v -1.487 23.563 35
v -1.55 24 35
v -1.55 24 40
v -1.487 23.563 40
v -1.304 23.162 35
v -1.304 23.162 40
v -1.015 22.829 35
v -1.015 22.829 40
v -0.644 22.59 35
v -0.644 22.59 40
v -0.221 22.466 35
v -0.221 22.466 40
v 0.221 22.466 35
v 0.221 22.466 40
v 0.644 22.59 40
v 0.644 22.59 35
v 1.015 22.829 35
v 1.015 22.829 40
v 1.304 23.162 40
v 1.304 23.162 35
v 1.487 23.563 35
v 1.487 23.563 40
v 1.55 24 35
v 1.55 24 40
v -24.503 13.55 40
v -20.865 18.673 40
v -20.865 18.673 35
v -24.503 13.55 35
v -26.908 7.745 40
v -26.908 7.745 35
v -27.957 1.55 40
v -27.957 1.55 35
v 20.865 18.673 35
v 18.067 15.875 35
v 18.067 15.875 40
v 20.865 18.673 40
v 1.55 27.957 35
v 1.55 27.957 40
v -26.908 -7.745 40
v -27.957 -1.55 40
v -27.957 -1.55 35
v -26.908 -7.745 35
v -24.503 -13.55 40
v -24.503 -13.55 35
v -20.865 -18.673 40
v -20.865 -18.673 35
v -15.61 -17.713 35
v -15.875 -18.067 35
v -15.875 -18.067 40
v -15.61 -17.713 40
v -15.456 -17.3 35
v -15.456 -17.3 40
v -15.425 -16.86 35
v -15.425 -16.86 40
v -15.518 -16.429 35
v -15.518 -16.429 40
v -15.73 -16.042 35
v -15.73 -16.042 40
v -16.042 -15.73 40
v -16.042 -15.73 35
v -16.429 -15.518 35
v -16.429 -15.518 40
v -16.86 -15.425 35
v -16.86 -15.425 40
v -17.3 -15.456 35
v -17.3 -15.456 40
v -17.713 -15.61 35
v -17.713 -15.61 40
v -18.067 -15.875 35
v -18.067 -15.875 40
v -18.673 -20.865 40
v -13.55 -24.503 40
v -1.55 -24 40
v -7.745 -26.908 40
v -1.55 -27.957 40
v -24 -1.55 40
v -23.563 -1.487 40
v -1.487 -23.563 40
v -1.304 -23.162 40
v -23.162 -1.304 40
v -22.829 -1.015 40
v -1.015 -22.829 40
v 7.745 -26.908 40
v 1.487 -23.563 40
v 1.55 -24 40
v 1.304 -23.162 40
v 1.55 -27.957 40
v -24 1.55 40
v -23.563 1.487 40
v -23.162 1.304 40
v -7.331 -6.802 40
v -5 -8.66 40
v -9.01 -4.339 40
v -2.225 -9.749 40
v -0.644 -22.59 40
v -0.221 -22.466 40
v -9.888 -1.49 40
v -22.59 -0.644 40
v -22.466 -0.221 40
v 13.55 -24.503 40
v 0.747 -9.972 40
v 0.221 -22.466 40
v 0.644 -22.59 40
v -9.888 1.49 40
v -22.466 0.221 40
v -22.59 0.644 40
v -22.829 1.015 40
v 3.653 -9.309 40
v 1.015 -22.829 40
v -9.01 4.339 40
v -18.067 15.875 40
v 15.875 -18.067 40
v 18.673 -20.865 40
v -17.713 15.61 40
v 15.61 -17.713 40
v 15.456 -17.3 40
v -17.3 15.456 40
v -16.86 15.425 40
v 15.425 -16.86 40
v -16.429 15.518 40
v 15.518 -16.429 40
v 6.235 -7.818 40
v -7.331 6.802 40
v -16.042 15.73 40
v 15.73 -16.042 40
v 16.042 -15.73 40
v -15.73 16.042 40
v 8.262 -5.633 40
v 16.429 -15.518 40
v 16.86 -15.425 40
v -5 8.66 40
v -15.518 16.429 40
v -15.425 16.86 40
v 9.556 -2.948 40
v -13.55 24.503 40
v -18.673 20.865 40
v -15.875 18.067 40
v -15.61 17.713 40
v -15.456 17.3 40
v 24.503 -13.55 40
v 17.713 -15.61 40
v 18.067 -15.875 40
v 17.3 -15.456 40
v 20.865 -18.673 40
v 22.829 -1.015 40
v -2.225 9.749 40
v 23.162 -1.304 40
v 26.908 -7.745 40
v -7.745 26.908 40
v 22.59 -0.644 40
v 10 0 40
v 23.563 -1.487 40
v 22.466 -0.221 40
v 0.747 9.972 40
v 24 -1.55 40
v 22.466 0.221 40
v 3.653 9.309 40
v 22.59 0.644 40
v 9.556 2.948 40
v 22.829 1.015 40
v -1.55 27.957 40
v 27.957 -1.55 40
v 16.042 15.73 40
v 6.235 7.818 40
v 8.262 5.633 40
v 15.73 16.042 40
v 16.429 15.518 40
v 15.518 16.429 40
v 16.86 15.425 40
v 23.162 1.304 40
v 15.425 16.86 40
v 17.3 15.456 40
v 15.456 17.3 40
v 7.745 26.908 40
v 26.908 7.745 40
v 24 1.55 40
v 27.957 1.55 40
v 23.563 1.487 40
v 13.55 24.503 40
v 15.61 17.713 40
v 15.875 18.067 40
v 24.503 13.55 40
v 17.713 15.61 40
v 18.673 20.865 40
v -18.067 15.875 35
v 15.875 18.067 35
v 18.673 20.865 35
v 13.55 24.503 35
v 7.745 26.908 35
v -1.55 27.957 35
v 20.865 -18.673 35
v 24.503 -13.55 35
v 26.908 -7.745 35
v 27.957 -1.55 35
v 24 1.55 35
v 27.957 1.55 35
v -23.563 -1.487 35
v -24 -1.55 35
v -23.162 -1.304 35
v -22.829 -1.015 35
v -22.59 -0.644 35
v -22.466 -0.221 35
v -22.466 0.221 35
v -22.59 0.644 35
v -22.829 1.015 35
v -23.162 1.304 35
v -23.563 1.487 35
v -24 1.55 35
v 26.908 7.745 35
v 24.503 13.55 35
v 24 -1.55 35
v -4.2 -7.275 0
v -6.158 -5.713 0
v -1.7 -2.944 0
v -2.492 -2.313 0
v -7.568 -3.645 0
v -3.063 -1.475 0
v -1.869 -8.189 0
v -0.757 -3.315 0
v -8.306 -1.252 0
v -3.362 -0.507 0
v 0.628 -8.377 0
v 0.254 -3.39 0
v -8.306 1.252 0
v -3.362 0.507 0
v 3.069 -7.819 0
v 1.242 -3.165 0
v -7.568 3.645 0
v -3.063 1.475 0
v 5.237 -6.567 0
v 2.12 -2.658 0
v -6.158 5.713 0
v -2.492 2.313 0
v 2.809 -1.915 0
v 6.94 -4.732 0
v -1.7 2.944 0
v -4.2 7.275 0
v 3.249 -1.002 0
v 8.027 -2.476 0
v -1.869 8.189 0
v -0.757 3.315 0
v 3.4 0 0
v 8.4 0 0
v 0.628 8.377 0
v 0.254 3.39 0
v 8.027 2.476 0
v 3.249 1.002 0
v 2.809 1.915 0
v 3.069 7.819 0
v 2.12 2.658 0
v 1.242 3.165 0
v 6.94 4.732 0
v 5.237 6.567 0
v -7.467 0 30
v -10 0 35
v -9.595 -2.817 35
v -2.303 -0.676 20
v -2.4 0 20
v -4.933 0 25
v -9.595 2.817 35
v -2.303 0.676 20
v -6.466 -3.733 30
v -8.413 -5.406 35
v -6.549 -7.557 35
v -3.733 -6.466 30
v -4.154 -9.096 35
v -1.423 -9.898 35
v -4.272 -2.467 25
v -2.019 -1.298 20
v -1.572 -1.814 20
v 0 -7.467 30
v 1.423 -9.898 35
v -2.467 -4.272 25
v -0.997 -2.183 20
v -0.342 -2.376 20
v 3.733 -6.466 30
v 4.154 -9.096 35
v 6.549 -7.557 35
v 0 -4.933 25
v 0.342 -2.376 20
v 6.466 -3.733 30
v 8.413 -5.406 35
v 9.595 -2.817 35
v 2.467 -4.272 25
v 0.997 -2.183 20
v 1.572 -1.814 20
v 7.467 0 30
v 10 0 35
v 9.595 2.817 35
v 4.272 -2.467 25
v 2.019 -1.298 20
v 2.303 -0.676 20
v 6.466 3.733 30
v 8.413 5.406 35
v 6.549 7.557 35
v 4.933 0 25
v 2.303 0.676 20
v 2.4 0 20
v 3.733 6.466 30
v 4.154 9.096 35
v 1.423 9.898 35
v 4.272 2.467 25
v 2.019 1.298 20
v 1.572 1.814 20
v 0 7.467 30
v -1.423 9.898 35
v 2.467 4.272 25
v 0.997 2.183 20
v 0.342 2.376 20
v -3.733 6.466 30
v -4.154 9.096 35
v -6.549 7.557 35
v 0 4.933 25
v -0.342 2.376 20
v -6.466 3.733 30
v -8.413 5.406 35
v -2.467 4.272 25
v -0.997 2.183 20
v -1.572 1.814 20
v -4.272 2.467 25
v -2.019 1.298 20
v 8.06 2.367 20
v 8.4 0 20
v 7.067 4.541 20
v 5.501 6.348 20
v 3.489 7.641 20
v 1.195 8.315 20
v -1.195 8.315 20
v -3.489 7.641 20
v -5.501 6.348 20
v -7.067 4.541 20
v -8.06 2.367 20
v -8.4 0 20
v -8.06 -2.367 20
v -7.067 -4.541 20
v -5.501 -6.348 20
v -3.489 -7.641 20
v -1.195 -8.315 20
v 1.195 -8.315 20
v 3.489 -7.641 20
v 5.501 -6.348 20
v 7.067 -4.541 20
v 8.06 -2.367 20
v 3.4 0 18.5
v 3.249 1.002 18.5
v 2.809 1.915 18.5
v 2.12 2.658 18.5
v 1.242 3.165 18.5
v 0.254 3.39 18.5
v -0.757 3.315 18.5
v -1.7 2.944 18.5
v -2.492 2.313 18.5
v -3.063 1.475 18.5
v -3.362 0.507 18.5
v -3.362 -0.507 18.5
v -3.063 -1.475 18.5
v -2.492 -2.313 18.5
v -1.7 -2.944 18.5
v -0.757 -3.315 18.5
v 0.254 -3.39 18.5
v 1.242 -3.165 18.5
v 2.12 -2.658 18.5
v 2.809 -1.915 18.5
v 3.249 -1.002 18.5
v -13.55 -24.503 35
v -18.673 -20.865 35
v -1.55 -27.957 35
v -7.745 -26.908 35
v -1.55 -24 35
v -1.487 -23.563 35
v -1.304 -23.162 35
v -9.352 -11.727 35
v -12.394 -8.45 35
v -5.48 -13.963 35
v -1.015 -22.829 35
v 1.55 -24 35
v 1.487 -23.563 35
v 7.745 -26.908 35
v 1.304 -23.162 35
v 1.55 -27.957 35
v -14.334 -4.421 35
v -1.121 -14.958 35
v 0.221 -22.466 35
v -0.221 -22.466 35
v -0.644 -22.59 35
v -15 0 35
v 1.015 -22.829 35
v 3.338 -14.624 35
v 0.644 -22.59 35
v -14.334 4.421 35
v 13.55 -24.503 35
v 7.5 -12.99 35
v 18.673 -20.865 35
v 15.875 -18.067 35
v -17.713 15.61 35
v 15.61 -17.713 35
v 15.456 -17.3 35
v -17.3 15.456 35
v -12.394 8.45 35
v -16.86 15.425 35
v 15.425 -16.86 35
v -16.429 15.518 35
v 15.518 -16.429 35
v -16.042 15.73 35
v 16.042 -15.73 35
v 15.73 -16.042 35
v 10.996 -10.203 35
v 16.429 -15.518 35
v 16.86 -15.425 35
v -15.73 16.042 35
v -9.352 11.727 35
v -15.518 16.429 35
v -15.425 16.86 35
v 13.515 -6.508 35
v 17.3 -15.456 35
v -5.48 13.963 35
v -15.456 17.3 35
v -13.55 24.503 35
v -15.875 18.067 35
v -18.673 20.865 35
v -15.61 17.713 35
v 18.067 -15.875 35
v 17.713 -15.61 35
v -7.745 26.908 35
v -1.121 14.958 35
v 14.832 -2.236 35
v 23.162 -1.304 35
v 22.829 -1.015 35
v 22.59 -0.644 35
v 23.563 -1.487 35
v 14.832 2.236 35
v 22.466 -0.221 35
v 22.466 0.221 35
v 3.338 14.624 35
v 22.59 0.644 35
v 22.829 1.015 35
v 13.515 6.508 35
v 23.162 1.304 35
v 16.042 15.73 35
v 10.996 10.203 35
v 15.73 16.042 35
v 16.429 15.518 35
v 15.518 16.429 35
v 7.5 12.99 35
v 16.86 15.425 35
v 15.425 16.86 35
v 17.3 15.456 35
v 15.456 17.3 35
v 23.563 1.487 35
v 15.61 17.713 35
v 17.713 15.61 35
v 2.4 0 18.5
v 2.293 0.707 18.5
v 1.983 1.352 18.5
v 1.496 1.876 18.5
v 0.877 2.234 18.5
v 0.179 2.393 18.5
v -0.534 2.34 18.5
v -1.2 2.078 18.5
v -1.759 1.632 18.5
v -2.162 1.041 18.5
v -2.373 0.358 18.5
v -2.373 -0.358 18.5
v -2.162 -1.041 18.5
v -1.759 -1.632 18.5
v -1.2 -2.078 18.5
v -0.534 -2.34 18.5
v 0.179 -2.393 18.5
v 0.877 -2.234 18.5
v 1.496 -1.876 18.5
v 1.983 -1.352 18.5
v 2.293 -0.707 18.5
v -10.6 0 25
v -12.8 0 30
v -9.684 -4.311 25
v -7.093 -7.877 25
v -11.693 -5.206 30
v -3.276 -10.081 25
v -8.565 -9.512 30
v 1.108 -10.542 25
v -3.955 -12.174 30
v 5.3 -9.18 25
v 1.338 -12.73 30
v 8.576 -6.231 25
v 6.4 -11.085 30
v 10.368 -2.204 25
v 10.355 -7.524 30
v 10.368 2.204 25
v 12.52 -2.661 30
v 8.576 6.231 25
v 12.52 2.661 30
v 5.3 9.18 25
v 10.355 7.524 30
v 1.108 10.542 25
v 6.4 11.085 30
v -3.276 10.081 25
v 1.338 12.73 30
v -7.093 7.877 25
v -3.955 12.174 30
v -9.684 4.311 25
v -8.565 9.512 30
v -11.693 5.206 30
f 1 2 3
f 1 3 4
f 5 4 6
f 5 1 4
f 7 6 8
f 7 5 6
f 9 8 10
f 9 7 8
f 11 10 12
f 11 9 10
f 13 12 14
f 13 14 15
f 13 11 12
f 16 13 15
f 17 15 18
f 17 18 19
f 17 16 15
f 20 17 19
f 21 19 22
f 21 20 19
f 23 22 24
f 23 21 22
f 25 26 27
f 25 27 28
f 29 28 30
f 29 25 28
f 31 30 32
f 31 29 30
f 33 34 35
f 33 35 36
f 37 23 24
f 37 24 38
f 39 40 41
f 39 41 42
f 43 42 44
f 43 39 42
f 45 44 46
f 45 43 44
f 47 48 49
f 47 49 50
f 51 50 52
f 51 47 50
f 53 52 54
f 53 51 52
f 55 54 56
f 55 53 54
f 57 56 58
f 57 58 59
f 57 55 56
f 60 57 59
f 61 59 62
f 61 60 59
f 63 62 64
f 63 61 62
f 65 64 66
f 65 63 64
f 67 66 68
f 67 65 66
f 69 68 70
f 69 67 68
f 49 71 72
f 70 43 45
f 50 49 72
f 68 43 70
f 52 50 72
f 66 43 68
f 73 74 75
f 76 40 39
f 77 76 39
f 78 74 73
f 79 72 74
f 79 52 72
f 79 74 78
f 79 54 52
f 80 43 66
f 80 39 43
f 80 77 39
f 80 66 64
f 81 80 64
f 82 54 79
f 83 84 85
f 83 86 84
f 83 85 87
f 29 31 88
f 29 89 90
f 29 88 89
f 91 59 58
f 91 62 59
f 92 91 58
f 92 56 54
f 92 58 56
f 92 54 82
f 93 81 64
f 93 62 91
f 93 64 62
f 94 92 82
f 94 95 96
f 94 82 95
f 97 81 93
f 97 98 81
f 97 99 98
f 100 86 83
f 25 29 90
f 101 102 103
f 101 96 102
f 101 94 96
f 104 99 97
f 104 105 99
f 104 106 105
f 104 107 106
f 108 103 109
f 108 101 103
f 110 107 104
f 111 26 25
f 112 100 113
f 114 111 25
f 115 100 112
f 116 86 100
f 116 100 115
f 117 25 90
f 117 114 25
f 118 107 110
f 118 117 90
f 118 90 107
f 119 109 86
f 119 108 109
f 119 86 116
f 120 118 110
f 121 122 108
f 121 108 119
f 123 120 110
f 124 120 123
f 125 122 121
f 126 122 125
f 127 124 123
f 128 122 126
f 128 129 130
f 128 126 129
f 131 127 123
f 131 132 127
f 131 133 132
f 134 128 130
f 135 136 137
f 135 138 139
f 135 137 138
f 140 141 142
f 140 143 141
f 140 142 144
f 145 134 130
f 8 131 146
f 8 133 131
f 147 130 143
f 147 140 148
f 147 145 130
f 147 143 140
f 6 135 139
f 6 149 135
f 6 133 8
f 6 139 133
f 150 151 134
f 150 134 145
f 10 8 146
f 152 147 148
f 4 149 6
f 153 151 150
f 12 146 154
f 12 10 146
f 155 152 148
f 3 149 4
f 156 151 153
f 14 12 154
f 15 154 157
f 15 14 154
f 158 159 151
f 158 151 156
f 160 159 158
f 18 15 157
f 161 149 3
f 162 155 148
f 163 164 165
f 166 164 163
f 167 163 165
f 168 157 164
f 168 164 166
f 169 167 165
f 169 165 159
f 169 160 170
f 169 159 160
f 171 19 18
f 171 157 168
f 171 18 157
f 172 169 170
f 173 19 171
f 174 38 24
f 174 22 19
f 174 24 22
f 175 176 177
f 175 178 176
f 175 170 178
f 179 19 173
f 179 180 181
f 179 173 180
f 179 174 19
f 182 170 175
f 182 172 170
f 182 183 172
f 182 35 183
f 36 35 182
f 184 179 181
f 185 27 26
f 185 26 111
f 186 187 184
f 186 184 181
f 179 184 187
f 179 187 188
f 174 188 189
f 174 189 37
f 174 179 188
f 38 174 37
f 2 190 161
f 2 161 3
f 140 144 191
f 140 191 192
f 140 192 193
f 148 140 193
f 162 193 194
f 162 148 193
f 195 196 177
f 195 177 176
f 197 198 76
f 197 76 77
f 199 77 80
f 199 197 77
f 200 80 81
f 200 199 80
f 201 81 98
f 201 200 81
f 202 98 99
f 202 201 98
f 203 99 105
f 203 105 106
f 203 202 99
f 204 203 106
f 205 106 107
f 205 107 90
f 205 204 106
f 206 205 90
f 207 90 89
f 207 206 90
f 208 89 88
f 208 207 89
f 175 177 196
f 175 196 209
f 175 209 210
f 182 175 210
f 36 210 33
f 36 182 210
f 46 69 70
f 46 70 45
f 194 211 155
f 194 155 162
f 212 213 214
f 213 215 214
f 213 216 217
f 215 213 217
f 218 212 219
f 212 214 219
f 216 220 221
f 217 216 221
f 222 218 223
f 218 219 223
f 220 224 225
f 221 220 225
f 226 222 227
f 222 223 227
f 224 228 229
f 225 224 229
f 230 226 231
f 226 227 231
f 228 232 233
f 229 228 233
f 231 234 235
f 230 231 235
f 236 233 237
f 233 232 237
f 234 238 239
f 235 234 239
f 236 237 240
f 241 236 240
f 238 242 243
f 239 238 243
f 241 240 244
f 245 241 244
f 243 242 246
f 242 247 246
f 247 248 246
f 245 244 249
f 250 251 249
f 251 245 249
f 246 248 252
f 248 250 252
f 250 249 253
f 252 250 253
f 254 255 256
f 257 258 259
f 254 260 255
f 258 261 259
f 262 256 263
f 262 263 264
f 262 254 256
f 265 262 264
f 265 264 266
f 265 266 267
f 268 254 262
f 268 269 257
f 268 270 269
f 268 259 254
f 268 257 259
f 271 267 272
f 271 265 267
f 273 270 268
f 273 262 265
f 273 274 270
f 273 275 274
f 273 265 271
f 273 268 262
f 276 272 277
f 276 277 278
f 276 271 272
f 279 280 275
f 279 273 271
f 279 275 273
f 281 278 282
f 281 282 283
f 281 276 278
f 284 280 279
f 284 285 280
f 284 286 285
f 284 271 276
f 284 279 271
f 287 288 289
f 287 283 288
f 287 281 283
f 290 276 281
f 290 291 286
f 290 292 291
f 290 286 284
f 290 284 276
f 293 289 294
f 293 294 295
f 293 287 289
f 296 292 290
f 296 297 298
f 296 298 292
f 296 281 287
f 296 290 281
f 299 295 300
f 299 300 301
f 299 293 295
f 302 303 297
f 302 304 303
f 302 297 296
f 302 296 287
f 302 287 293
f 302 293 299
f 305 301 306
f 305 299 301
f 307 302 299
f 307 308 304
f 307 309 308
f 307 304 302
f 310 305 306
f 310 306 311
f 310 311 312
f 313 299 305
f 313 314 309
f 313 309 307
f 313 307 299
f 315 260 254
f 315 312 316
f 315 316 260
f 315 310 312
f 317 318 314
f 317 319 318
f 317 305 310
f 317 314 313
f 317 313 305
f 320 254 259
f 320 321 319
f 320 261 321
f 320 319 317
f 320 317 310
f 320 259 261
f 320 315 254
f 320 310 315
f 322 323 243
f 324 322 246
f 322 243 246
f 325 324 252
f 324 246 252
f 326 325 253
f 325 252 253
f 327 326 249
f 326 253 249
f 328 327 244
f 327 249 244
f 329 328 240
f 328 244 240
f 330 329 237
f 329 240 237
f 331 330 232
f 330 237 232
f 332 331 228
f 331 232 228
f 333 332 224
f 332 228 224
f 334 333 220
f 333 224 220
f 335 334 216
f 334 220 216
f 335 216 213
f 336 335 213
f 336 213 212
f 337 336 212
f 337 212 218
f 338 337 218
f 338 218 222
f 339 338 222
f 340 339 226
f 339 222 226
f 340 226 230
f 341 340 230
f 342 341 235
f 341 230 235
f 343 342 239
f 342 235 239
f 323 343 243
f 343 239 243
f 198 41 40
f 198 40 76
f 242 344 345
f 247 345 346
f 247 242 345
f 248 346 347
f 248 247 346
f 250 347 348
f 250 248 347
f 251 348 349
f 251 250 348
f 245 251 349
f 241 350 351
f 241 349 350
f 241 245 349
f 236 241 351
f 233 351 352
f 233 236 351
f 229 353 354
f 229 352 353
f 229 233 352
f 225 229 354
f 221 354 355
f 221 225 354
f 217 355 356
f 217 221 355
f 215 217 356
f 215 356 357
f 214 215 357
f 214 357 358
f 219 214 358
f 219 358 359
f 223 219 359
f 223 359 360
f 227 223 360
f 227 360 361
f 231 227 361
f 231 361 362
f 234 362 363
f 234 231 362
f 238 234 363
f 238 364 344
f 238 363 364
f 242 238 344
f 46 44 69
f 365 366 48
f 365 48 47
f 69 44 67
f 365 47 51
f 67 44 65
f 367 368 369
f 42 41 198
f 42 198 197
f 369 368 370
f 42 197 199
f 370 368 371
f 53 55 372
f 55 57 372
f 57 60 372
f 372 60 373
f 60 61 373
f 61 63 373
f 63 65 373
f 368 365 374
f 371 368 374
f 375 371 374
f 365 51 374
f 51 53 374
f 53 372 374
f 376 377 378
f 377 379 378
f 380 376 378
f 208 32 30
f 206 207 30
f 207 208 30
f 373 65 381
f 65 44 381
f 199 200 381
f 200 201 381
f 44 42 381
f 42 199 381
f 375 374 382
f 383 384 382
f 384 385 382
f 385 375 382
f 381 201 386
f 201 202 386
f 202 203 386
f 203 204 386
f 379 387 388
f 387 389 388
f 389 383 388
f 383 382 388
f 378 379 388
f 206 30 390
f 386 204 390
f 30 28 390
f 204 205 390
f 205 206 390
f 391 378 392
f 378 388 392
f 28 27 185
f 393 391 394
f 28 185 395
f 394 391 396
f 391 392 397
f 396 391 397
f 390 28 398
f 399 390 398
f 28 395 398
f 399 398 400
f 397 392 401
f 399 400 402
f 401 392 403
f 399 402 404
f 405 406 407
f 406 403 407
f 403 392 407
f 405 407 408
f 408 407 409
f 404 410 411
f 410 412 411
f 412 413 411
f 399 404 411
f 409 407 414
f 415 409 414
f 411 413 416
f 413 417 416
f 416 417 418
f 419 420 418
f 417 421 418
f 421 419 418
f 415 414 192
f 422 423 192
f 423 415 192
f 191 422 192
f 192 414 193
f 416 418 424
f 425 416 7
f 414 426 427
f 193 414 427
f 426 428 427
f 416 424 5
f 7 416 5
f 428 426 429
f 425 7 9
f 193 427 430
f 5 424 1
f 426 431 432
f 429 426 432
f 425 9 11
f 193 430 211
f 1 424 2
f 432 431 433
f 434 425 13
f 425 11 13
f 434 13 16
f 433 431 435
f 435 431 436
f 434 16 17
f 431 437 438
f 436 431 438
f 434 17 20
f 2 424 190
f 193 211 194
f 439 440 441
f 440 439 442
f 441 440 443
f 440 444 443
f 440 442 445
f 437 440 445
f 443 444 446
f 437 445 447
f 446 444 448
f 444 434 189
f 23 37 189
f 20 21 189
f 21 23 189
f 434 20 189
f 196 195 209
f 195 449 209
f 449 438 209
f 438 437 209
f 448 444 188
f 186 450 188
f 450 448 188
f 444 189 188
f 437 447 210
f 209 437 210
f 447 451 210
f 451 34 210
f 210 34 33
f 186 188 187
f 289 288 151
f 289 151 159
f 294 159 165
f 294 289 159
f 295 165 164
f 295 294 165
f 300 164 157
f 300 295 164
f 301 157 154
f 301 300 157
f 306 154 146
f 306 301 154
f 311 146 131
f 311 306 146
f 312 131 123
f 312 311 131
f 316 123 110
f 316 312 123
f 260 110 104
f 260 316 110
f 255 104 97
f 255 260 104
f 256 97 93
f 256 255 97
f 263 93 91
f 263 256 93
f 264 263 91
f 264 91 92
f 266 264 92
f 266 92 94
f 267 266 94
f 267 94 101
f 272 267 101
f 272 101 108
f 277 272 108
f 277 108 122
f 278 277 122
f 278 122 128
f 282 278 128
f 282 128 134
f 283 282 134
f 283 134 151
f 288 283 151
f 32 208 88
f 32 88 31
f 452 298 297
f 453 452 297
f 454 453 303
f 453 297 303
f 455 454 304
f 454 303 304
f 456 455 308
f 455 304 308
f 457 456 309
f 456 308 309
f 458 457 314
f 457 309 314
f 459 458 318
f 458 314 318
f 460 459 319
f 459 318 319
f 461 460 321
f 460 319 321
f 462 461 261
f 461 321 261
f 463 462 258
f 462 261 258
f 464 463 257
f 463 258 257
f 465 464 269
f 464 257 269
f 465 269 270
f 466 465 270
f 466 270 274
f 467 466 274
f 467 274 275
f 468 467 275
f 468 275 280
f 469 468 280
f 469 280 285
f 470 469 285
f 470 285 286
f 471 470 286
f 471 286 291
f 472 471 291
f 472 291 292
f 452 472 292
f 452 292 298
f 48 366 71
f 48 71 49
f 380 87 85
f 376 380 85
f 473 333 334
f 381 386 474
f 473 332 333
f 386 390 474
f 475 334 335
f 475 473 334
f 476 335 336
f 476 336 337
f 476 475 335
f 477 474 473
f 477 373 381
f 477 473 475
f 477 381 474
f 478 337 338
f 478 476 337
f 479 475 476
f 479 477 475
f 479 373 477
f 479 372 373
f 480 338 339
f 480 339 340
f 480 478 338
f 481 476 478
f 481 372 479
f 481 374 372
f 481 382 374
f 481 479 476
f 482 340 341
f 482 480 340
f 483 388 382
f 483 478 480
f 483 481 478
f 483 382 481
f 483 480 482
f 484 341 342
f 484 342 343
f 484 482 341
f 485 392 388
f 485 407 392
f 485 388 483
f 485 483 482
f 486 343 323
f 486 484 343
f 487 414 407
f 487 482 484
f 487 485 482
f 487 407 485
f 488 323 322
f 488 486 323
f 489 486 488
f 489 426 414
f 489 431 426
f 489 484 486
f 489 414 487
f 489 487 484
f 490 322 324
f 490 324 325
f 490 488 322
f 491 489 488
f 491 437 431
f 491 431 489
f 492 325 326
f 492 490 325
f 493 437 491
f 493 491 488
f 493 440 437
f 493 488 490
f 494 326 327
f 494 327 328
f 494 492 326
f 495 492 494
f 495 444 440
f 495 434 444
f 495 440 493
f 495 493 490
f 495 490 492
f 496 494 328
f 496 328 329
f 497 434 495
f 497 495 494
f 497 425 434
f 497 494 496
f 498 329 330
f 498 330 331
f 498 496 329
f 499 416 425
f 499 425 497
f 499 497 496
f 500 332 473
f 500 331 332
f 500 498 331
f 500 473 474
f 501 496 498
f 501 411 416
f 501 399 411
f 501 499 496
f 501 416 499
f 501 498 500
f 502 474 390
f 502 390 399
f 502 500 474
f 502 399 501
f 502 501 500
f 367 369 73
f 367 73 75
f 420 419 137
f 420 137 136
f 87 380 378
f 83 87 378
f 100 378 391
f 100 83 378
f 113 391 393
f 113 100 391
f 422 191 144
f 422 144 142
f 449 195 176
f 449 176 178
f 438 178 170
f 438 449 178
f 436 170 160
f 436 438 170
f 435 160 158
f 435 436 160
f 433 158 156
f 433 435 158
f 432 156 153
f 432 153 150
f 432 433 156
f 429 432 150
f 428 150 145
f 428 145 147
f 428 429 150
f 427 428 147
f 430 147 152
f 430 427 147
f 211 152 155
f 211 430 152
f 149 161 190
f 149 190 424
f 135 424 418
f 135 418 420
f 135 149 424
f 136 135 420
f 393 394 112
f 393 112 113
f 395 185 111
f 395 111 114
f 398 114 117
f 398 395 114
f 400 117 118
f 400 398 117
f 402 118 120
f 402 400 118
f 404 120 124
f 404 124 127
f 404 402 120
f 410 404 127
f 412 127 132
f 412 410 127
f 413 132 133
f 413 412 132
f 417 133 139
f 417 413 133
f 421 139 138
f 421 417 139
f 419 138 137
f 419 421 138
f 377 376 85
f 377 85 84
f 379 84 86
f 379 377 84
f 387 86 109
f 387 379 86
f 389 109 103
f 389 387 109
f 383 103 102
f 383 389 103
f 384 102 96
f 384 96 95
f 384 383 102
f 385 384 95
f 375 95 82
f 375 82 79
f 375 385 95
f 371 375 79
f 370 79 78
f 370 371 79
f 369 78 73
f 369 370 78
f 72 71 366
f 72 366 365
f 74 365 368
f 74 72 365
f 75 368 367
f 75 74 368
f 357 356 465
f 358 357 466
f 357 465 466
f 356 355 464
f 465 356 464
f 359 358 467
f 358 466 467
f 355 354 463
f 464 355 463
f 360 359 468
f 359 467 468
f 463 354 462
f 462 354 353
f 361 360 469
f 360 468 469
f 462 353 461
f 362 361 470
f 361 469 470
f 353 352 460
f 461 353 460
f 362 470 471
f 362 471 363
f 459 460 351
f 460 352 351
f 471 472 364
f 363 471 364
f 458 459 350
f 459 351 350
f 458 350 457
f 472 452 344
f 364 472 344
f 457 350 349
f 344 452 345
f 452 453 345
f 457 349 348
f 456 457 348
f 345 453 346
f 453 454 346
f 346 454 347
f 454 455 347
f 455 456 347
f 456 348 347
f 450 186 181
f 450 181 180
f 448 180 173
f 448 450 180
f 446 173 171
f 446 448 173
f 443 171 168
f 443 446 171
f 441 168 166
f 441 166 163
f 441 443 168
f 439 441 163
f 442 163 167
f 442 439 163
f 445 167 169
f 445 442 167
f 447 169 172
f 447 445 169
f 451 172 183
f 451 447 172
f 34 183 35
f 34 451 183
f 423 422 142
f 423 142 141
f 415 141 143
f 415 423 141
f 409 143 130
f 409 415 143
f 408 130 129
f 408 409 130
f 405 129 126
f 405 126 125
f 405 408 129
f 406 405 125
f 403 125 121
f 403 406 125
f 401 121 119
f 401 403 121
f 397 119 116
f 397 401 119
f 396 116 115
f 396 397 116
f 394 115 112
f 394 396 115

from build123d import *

# Parameters (mm, degrees)
SKETCH1_R           = 8.4
SKETCH1_R_2         = 3.4
BOSS_EXTRUDE1_DEPTH = 20
SKETCH2_R           = 8.4
SKETCH2_R_2         = 2.4
BOSS_EXTRUDE2_DEPTH = 1.5
SKETCH3_R           = 15
SKETCH3_R_2         = 10
BOSS_EXTRUDE3_DEPTH = 5
SKETCH5_R           = 28
SKETCH5_R_2         = 10
BOSS_EXTRUDE4_DEPTH = 5
CUT_EXTRUDE1_DEPTH  = 5


with BuildPart() as part:
    # Sketch1 → Boss-Extrude1 (new body)
    with BuildSketch(Plane.XY):
        Circle(SKETCH1_R)
        Circle(SKETCH1_R_2, mode=Mode.SUBTRACT)
    extrude(amount=BOSS_EXTRUDE1_DEPTH)

    # Sketch2 → Boss-Extrude2 (add)
    with BuildSketch(Plane.XY.offset(20)):
        Circle(SKETCH2_R)
        Circle(SKETCH2_R_2, mode=Mode.SUBTRACT)
    extrude(amount=-BOSS_EXTRUDE2_DEPTH)



with BuildPart() as body_2:
    # Sketch3 → Boss-Extrude3 (new body)
    with BuildSketch(Plane.XY.offset(35)):
        Circle(SKETCH3_R)
        Circle(SKETCH3_R_2, mode=Mode.SUBTRACT)
    extrude(amount=BOSS_EXTRUDE3_DEPTH)


with BuildPart() as part_1:
    add(part.part)

    add(body_2.part)  # Revolve1 merges body 2
    # Sketch4 → Revolve1 (revolve)
    with BuildSketch(Plane(origin=(0, 0, 0), x_dir=(1, 0, 0), z_dir=(0, 1, 0))):
        Polygon((-8.4, -20), (-15, -35), (-10, -35), (-2.4, -20), align=None)
    revolve(axis=Axis((0, 0, 20), (0, 0, 1)))

    # Sketch5 → Boss-Extrude4 (add)
    with BuildSketch(Plane.XY.offset(40)):
        Circle(SKETCH5_R)
        Circle(SKETCH5_R_2, mode=Mode.SUBTRACT)
    extrude(amount=-BOSS_EXTRUDE4_DEPTH)

    # Sketch6 → Cut-Extrude1 (cut)
    with BuildSketch(Plane(origin=(0, 0, 35), x_dir=(-1, 0, 0), z_dir=(0, 0, -1))):
        with BuildLine():
            Line((-1.55, 24), (-1.55, 29))
            Line((-1.55, 29), (1.55, 29))
            Line((1.55, 29), (1.55, 24))
            ThreePointArc((1.55, 24), (0, 22.45), (-1.55, 24))
        make_face()
        with BuildLine():
            Line((21.602112165, 19.410081144), (18.066578259, 15.874547238))
            ThreePointArc((18.066578259, 15.874547238), (15.874547238, 15.874547238), (15.874547238, 18.066578259))
            Line((15.874547238, 18.066578259), (19.410081144, 21.602112165))
            Line((19.410081144, 21.602112165), (21.602112165, 19.410081144))
        make_face()
        with BuildLine():
            Line((29, -1.55), (24, -1.55))
            ThreePointArc((24, -1.55), (22.45, 0), (24, 1.55))
            Line((24, 1.55), (29, 1.55))
            Line((29, 1.55), (29, -1.55))
        make_face()
        with BuildLine():
            Line((19.410081144, -21.602112165), (15.874547238, -18.066578259))
            ThreePointArc((15.874547238, -18.066578259), (15.874547238, -15.874547238), (18.066578259, -15.874547238))
            Line((18.066578259, -15.874547238), (21.602112165, -19.410081144))
            Line((21.602112165, -19.410081144), (19.410081144, -21.602112165))
        make_face()
        with BuildLine():
            Line((-1.55, -29), (-1.55, -24))
            ThreePointArc((-1.55, -24), (0, -22.45), (1.55, -24))
            Line((1.55, -24), (1.55, -29))
            Line((1.55, -29), (-1.55, -29))
        make_face()
        with BuildLine():
            Line((-21.602112165, -19.410081144), (-18.066578259, -15.874547238))
            ThreePointArc((-18.066578259, -15.874547238), (-15.874547238, -15.874547238), (-15.874547238, -18.066578259))
            Line((-15.874547238, -18.066578259), (-19.410081144, -21.602112165))
            Line((-19.410081144, -21.602112165), (-21.602112165, -19.410081144))
        make_face()
        with BuildLine():
            Line((-29, 1.55), (-24, 1.55))
            ThreePointArc((-24, 1.55), (-22.45, 0), (-24, -1.55))
            Line((-24, -1.55), (-29, -1.55))
            Line((-29, -1.55), (-29, 1.55))
        make_face()
        with BuildLine():
            Line((-19.410081144, 21.602112165), (-15.874547238, 18.066578259))
            ThreePointArc((-15.874547238, 18.066578259), (-15.874547238, 15.874547238), (-18.066578259, 15.874547238))
            Line((-18.066578259, 15.874547238), (-21.602112165, 19.410081144))
            Line((-21.602112165, 19.410081144), (-19.410081144, 21.602112165))
        make_face()
    extrude(amount=-CUT_EXTRUDE1_DEPTH, mode=Mode.SUBTRACT)


solid = part_1.part
